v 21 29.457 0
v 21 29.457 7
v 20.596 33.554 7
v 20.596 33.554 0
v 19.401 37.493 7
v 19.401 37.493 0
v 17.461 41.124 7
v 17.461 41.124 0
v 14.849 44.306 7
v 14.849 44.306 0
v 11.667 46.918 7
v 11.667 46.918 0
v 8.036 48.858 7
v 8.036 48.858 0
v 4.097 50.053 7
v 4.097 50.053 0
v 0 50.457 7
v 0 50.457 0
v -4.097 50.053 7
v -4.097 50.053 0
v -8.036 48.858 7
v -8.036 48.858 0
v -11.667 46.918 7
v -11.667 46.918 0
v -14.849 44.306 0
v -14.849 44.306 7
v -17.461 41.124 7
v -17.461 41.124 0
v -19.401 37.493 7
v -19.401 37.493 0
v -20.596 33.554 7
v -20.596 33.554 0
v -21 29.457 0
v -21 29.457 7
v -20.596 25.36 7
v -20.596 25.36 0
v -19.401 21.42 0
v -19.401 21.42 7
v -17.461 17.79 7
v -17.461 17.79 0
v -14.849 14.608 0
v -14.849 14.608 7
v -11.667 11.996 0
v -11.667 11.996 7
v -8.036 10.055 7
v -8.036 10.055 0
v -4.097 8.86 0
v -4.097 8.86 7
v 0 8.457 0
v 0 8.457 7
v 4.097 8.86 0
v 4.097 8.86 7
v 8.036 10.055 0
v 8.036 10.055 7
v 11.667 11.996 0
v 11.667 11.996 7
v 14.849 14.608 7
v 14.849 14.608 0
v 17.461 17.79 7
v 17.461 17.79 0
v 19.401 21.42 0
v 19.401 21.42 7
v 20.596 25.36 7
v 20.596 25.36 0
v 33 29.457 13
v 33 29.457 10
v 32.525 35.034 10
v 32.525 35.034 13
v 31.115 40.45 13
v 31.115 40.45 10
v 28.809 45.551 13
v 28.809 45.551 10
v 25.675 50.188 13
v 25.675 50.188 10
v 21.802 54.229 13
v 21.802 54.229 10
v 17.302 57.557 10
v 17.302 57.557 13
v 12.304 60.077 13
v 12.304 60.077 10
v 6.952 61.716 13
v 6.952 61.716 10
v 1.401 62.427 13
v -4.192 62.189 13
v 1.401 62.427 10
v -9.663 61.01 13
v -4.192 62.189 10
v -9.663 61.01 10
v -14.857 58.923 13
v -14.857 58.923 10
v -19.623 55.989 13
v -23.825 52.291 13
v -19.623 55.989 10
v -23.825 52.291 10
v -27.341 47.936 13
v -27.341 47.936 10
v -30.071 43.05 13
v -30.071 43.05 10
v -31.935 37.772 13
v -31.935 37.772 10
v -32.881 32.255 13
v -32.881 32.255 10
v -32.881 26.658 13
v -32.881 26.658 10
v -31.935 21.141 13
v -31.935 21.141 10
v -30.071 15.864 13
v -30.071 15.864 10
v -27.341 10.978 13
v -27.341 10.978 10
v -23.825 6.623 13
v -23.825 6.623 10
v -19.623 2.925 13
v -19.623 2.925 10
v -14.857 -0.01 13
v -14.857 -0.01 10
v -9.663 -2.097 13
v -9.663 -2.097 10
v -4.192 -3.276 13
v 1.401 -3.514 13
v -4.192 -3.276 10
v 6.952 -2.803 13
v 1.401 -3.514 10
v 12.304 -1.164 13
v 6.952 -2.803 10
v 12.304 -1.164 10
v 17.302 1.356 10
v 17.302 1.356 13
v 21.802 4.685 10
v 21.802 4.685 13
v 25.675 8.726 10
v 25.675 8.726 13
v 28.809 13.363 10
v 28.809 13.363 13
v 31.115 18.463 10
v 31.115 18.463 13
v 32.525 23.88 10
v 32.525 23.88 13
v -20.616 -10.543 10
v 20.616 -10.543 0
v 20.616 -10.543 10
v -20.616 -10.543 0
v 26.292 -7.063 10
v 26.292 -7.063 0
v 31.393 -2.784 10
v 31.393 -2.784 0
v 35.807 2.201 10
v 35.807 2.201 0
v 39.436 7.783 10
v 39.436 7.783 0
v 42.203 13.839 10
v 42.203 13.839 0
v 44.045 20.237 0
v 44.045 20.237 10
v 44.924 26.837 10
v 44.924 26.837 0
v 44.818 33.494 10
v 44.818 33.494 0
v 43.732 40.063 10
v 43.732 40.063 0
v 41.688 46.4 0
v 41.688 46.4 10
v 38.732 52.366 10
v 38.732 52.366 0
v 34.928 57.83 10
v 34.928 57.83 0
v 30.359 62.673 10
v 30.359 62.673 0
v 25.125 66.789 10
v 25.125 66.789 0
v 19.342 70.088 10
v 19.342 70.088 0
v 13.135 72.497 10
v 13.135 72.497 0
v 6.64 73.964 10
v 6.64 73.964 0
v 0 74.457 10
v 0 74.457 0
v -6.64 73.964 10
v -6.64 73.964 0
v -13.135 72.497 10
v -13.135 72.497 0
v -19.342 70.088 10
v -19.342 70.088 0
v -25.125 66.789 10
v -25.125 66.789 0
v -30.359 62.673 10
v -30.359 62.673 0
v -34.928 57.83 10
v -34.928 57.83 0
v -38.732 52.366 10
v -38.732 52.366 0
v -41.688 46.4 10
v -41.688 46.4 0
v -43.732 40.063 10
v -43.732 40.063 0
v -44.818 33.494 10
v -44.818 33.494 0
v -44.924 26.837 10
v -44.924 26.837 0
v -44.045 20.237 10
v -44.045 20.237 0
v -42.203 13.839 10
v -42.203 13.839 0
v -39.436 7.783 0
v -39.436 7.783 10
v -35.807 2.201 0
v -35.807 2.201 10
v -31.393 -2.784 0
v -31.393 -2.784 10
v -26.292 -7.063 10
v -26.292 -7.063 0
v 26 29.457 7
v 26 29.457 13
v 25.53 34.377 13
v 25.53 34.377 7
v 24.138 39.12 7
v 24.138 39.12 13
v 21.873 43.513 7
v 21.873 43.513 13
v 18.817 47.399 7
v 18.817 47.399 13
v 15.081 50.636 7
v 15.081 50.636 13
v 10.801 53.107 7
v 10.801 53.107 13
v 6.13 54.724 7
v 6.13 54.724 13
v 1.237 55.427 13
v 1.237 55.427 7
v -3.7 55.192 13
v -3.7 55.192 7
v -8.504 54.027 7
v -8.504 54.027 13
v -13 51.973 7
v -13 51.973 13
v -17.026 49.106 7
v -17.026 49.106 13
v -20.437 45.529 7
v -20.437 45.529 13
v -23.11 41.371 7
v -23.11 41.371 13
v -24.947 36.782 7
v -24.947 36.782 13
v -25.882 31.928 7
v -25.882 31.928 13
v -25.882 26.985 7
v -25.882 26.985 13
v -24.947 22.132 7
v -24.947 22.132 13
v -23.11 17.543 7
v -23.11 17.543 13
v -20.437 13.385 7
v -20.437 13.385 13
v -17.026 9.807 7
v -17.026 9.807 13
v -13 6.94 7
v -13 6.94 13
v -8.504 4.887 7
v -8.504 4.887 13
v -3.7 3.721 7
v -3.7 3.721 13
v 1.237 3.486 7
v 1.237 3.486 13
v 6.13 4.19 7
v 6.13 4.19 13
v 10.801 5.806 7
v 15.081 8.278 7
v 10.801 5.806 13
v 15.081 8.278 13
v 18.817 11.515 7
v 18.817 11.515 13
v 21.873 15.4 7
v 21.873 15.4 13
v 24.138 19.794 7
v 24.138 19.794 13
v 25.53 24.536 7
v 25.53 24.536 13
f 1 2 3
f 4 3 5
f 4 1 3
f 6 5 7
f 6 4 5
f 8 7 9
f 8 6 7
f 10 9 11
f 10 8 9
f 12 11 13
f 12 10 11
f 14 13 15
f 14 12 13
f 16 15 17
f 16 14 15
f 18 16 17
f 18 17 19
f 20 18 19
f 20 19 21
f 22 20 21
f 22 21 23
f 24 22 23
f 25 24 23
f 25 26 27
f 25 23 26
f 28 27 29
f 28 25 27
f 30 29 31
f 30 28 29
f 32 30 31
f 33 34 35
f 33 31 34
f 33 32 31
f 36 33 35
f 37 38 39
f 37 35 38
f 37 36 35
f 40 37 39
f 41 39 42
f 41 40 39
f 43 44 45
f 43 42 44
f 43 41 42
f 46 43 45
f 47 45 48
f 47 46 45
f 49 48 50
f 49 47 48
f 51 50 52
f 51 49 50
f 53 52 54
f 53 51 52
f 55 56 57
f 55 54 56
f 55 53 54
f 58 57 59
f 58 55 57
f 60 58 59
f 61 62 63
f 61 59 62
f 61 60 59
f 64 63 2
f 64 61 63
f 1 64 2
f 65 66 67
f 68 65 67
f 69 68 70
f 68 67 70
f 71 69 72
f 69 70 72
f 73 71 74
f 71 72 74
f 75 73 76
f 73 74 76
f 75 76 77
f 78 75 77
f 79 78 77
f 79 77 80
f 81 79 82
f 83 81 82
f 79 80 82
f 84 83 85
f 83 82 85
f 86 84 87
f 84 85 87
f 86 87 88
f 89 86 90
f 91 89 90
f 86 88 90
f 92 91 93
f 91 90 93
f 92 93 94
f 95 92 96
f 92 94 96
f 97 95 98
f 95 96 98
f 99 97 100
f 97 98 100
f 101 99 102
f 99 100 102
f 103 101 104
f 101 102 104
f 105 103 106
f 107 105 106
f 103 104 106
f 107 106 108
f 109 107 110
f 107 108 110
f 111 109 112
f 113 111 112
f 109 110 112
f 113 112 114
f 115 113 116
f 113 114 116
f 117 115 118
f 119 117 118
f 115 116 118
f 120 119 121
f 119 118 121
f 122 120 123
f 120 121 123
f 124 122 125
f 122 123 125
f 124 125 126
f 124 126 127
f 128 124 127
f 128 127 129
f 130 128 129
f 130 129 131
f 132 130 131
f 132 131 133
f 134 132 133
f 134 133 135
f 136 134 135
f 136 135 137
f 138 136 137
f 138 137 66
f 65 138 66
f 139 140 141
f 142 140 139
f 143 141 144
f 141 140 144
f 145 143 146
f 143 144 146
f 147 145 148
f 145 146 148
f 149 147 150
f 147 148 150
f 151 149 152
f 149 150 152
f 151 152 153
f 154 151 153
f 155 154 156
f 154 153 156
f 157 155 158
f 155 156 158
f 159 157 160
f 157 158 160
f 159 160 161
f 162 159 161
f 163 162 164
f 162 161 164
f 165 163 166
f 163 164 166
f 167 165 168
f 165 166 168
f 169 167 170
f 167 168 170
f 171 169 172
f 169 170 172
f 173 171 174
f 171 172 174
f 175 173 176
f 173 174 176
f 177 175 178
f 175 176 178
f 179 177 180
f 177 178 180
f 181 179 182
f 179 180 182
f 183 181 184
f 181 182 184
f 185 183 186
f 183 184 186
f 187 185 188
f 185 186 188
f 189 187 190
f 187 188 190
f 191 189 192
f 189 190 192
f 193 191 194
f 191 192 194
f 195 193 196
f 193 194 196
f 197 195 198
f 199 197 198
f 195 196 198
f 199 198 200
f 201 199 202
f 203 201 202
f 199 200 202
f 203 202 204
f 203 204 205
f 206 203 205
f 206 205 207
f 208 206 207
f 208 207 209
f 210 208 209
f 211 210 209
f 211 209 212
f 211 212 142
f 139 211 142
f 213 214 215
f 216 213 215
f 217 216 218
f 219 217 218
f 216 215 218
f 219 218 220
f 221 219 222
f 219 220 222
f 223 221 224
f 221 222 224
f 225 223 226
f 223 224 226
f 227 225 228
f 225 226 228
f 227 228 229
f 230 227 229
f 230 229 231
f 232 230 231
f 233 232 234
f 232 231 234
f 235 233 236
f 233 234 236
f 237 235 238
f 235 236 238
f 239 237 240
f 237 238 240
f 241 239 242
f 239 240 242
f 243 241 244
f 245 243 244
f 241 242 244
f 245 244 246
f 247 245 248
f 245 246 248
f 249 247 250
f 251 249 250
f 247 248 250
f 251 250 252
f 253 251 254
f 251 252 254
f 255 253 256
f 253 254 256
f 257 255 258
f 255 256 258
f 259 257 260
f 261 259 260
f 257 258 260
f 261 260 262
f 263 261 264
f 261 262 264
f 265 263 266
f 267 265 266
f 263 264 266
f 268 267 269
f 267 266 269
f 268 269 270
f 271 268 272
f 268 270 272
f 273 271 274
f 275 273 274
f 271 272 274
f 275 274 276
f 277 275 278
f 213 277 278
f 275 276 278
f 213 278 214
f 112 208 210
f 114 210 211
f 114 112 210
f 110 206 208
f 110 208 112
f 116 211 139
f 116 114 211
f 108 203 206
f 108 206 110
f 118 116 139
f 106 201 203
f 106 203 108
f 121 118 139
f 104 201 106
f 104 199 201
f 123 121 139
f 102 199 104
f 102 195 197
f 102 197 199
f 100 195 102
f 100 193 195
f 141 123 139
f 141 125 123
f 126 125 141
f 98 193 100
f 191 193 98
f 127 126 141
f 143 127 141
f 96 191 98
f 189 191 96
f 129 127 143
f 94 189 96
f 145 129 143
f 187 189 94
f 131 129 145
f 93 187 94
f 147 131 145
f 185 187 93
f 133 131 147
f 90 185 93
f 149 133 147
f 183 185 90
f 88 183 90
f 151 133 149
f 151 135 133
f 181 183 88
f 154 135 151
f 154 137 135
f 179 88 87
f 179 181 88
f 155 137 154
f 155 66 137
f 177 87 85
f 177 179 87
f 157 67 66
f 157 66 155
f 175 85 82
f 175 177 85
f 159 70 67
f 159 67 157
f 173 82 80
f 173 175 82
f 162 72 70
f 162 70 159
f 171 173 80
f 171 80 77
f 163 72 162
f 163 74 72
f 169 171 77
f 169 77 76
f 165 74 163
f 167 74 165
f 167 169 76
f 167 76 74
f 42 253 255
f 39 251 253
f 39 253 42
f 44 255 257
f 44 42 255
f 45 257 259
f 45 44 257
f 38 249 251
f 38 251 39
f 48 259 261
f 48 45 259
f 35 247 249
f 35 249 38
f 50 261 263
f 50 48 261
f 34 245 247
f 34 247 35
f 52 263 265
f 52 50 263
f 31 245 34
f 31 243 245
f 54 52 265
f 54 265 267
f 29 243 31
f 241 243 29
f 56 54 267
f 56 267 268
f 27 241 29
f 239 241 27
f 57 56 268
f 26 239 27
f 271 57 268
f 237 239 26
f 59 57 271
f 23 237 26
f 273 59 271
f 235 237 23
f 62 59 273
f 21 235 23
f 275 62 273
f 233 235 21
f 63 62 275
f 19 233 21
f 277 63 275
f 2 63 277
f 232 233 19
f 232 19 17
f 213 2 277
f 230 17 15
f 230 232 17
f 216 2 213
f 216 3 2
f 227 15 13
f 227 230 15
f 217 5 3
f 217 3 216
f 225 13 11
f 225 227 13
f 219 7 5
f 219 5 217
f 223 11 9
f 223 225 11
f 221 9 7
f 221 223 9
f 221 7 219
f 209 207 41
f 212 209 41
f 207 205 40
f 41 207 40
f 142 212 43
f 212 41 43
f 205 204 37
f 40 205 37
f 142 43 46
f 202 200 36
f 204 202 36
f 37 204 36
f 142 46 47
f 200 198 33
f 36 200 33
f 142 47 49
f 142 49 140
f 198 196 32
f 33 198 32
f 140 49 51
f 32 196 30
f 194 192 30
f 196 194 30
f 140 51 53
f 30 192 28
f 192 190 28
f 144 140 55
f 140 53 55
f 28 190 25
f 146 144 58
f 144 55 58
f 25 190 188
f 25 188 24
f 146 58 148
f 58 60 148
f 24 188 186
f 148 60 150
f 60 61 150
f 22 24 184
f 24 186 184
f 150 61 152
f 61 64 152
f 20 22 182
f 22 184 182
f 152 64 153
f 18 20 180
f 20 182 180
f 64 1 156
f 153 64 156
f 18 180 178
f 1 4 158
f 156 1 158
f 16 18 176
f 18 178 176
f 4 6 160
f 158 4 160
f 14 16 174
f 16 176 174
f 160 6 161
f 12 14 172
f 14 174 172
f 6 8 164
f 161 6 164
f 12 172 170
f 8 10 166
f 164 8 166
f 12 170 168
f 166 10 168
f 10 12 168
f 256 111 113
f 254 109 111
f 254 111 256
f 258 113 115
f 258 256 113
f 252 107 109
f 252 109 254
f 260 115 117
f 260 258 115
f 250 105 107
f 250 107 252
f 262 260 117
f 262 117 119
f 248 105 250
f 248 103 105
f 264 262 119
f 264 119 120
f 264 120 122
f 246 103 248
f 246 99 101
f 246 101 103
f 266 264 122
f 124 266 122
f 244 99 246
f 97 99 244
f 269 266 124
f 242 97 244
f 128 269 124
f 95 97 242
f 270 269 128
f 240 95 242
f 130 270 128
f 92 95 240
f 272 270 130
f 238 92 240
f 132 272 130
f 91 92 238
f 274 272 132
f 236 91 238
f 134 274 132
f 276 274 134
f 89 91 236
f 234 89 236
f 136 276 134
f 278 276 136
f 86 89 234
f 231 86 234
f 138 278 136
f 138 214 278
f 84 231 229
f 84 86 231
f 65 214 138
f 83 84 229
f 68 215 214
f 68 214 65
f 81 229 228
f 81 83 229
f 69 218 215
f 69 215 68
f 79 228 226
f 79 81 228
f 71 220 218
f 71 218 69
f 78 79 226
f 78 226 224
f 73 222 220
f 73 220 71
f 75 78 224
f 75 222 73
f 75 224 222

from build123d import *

# Parameters (mm, degrees)
SKETCH_1_R          = 45
SKETCH_1_R_2        = 21
EXTRUDE_1_DEPTH     = 10
SKETCH_2_R          = 33
SKETCH_2_R_2        = 21
EXTRUDE_2_DEPTH     = 3
CUT_EXTRUDE_1_DEPTH = 88.964820488
SKETCH_5_R          = 26
CUT_EXTRUDE_2_DEPTH = 6


with BuildPart() as part:
    # 草图1 → 凸台-拉伸1 (new body)
    with BuildSketch(Plane.XY):
        with Locations((0, 29.456763584)):
            Circle(SKETCH_1_R)
        with Locations((0, 29.456763584)):
            Circle(SKETCH_1_R_2, mode=Mode.SUBTRACT)
    extrude(amount=EXTRUDE_1_DEPTH)

    # 草图2 → 凸台-拉伸2 (add)
    with BuildSketch(Plane.XY.offset(10)):
        with Locations((0, 29.456763584)):
            Circle(SKETCH_2_R)
        with Locations((0, 29.456763584)):
            Circle(SKETCH_2_R_2, mode=Mode.SUBTRACT)
    extrude(amount=EXTRUDE_2_DEPTH)

    # 草图4 → 切除-拉伸1 (cut, through all)
    with BuildSketch(Plane(origin=(0, 0, 0), x_dir=(-1, 0, 0), z_dir=(0, 0, -1))):
        with BuildLine():
            Line((-20.615528128, -10.543236416), (20.615528128, -10.543236416))
            ThreePointArc((20.615528128, -10.543236416), (0, -15.543236416), (-20.615528128, -10.543236416))
        make_face()
    extrude(amount=-CUT_EXTRUDE_1_DEPTH, mode=Mode.SUBTRACT)

    # 草图5 → 切除-拉伸2 (cut)
    with BuildSketch(Plane.XY.offset(13)):
        with Locations((0, 29.456763584)):
            Circle(SKETCH_5_R)
    extrude(amount=-CUT_EXTRUDE_2_DEPTH, mode=Mode.SUBTRACT)


solid = part.part
